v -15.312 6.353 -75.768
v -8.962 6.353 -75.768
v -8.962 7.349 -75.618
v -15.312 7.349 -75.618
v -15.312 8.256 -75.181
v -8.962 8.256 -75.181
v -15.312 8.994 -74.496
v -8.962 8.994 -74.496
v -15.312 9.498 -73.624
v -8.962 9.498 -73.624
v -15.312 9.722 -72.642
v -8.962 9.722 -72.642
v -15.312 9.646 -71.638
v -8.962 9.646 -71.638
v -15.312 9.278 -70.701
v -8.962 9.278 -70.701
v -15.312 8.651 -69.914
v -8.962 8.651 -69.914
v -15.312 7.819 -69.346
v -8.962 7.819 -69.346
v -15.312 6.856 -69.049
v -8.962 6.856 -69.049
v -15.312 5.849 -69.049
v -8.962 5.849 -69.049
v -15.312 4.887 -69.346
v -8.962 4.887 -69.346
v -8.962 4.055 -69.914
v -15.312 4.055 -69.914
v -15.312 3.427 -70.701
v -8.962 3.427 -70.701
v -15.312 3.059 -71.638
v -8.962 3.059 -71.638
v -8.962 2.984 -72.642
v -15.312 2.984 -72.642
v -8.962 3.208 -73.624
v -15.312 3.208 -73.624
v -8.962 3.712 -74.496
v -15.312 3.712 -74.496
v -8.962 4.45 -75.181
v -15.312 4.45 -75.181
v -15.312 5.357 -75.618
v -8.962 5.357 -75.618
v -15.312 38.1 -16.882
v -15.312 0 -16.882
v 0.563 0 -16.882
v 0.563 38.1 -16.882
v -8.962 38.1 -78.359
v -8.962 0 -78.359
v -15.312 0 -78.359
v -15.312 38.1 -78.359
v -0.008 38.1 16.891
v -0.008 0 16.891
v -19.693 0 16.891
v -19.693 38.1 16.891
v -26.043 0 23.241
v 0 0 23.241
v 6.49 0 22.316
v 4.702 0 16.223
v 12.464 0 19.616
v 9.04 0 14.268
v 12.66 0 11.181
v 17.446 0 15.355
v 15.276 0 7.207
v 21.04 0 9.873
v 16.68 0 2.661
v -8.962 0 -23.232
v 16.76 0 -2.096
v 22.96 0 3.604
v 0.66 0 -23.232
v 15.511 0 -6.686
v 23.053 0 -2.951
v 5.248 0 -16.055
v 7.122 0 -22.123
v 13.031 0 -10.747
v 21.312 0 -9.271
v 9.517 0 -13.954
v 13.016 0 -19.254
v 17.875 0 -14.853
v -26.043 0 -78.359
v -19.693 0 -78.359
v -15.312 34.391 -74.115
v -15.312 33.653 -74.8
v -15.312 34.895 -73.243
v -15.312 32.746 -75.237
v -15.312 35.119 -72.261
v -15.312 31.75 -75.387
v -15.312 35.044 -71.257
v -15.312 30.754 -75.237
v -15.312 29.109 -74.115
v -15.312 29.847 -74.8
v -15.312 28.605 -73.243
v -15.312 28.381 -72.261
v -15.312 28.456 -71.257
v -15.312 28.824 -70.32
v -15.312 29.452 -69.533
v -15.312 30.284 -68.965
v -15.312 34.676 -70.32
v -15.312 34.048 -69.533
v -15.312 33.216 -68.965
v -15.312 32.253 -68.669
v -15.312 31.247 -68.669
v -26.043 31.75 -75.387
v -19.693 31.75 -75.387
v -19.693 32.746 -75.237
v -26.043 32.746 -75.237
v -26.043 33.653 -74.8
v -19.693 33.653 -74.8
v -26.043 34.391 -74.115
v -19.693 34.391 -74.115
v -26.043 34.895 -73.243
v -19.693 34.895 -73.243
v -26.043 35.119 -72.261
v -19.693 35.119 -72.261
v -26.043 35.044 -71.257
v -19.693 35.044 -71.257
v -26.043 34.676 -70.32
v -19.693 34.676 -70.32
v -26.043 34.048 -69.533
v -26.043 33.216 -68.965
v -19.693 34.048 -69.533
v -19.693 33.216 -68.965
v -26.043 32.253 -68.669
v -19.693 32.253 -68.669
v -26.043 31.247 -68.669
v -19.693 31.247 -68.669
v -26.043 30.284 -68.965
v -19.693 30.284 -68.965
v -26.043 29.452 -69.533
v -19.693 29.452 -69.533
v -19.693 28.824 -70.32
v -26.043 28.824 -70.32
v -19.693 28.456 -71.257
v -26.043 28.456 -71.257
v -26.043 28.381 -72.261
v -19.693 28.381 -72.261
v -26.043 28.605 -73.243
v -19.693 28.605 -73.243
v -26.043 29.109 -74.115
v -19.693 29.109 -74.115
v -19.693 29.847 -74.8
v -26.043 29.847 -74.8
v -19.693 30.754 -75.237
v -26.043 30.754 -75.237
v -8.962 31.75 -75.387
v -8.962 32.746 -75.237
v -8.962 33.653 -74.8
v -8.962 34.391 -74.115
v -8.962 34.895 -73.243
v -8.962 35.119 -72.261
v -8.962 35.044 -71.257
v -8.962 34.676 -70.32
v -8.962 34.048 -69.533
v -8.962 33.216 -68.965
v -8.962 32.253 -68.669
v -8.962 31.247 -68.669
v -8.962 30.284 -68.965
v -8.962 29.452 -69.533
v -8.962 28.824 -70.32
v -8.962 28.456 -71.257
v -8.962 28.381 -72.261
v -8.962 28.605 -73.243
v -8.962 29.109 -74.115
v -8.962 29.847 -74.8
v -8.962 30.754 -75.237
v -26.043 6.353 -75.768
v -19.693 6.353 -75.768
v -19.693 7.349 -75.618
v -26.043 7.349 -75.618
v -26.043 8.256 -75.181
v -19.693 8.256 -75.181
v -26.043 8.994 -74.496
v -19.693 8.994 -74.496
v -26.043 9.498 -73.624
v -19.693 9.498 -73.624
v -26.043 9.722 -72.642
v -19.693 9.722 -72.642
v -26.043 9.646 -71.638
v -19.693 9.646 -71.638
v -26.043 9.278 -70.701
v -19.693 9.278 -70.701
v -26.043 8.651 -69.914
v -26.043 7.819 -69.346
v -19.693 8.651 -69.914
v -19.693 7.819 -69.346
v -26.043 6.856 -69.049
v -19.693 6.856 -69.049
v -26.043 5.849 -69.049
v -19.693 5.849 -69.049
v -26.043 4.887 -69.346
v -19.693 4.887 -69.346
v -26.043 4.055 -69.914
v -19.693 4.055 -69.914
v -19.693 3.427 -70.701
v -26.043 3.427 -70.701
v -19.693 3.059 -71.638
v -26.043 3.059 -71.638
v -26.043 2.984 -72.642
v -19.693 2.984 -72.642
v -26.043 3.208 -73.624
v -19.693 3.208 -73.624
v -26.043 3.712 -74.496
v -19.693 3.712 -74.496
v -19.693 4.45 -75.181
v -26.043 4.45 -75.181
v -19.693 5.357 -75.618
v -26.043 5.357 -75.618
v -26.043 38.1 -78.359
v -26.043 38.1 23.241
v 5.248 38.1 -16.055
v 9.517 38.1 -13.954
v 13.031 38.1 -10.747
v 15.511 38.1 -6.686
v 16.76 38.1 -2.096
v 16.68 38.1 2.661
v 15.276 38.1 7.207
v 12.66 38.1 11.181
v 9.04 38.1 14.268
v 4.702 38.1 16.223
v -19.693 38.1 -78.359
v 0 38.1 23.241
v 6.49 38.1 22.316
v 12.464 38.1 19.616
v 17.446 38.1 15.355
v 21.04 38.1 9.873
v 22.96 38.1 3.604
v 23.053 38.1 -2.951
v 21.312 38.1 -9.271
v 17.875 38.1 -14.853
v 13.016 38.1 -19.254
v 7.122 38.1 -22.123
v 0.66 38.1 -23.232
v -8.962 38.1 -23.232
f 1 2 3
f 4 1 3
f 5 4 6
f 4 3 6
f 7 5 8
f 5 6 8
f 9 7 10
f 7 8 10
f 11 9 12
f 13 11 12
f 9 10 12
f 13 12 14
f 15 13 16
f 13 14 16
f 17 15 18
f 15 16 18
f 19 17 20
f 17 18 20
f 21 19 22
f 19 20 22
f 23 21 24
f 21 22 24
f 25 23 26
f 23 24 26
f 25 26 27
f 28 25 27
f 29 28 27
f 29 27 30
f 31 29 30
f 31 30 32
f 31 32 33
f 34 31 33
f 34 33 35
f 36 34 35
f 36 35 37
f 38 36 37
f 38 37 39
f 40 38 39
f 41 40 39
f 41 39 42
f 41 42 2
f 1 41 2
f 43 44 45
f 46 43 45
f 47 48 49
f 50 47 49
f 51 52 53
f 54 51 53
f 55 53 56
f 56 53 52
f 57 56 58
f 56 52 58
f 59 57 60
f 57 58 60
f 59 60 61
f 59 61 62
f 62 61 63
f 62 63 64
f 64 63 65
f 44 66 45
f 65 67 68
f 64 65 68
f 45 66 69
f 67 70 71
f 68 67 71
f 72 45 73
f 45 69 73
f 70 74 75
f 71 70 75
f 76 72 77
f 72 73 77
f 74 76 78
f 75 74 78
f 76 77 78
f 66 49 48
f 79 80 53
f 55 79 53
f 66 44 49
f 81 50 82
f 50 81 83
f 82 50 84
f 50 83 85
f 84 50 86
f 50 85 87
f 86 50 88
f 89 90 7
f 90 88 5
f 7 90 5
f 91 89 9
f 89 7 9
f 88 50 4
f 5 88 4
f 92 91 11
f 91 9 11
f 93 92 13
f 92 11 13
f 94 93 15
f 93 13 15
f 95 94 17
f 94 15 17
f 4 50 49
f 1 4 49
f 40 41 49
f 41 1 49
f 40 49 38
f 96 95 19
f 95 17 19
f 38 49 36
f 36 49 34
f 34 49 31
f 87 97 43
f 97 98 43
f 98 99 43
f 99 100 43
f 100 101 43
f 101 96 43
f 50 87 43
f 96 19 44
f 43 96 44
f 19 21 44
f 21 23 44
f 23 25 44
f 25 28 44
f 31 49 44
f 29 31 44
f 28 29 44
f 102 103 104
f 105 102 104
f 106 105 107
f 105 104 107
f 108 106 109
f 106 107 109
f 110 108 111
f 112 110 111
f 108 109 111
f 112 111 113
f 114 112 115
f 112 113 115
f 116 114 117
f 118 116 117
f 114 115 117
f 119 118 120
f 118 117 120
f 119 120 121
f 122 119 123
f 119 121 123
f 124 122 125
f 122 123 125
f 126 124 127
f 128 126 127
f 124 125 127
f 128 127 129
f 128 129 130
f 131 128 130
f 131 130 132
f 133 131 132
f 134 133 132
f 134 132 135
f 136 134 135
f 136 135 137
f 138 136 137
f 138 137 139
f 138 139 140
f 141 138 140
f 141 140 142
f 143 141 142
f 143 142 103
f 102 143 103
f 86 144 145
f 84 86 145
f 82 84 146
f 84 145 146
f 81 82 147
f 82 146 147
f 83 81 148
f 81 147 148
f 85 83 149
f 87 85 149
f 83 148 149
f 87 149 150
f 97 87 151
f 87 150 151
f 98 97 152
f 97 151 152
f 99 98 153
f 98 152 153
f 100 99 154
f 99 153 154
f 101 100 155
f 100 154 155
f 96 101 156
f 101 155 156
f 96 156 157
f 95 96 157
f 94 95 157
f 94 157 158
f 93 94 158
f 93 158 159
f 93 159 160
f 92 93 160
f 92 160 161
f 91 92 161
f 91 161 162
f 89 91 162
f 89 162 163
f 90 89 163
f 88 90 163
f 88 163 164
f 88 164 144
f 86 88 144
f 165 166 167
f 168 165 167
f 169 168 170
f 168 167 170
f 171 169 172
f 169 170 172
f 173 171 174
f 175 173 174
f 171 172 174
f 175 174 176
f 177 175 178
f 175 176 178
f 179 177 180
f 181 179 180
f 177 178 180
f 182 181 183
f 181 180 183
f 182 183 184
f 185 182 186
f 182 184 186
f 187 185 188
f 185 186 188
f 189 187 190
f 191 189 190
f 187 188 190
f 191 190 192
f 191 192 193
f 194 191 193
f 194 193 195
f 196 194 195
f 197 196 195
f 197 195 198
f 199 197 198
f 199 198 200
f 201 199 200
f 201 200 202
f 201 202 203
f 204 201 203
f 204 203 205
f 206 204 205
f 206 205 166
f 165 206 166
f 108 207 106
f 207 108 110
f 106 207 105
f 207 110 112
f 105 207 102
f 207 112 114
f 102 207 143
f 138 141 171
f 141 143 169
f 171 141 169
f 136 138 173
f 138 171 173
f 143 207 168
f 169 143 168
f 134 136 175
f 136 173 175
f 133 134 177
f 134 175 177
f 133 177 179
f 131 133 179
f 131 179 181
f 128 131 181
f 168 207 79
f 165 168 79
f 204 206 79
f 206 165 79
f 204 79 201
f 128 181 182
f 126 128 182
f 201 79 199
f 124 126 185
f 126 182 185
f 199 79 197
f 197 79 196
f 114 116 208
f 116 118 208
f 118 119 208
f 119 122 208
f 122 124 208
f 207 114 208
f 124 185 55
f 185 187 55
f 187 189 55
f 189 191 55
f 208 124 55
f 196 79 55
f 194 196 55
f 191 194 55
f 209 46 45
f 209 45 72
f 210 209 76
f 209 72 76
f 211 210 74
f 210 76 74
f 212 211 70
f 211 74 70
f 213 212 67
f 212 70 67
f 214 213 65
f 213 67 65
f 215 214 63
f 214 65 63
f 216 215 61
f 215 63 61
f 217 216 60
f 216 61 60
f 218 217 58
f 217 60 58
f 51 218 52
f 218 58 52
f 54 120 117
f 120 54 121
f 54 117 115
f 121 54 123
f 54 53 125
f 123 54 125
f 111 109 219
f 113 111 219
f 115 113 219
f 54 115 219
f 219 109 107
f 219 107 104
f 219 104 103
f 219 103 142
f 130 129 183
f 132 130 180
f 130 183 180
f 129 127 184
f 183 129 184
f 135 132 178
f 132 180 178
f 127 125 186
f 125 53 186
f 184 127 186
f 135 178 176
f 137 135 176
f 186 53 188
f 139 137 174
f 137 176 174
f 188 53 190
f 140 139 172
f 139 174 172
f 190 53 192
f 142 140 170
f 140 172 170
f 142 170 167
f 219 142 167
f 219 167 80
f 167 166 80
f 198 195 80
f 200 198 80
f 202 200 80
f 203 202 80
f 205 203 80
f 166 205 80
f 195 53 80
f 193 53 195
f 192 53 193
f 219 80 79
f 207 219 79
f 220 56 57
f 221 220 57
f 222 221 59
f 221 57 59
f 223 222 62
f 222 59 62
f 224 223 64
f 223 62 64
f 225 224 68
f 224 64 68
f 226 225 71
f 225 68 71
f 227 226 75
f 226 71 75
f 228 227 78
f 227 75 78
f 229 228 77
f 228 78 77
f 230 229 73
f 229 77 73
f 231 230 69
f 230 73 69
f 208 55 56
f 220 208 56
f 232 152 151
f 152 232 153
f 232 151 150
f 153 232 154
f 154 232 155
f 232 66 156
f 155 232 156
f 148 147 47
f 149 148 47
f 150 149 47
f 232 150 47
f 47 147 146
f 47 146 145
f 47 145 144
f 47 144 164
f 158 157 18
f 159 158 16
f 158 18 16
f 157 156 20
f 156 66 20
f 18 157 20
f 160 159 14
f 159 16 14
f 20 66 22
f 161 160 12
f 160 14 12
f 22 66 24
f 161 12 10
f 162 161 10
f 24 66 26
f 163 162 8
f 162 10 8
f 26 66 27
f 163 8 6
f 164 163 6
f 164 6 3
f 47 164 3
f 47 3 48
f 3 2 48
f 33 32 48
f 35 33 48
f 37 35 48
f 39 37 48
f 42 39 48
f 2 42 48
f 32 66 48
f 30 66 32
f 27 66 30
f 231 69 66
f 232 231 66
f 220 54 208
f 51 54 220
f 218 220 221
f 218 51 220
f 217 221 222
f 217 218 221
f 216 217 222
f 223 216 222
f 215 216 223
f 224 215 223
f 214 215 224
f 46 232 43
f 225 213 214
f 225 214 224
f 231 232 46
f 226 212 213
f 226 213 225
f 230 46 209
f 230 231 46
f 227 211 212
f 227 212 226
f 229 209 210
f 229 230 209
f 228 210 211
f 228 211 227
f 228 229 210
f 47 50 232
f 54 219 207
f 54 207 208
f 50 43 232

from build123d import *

# Parameters (mm, degrees)
BOSS_EXTRUDE1_DEPTH = 38.1
SKETCH2_R           = 3.3782
CUT_EXTRUDE1_DEPTH  = 18.0815


with BuildPart() as part:
    # Sketch1 → Boss-Extrude1 (new body)
    with BuildSketch(Plane(origin=(0, 0, 0), x_dir=(1, 0, 0), z_dir=(0, 1, 0))):
        with BuildLine():
            Line((-0.008466667, -16.890997878), (-19.693466667, -16.890997878))
            Line((-19.693466667, -16.890997878), (-19.693466667, 78.359002122))
            Line((-19.693466667, 78.359002122), (-26.043466667, 78.359002122))
            Line((-26.043466667, 78.359002122), (-26.043466667, -23.240997878))
            Line((-26.043466667, -23.240997878), (0, -23.240997878))
            ThreePointArc((0, -23.240997878), (23.238651666, -0.33022889), (0.660391106, 23.231613503))
            Line((0.660391106, 23.231613503), (-8.961966667, 23.231613503))
            Line((-8.961966667, 23.231613503), (-8.961966667, 78.359002122))
            Line((-8.961966667, 78.359002122), (-15.311966667, 78.359002122))
            Line((-15.311966667, 78.359002122), (-15.311966667, 16.881613503))
            Line((-15.311966667, 16.881613503), (0.563033333, 16.881613503))
            ThreePointArc((0.563033333, 16.881613503), (16.888582117, -0.285788522), (-0.008466667, -16.890997878))
        make_face()
    extrude(amount=BOSS_EXTRUDE1_DEPTH)

    # Sketch2 → Cut-Extrude1 (cut, through all)
    with BuildSketch(Plane(origin=(-8.961966667, 0, 0), x_dir=(0, 0, -1), z_dir=(1, 0, 0))):
        with Locations((72.009002122, 31.75)):
            Circle(SKETCH2_R)
        with Locations((72.389957145, 6.352856986)):
            Circle(SKETCH2_R)
    extrude(amount=-CUT_EXTRUDE1_DEPTH, mode=Mode.SUBTRACT)


solid = part.part
